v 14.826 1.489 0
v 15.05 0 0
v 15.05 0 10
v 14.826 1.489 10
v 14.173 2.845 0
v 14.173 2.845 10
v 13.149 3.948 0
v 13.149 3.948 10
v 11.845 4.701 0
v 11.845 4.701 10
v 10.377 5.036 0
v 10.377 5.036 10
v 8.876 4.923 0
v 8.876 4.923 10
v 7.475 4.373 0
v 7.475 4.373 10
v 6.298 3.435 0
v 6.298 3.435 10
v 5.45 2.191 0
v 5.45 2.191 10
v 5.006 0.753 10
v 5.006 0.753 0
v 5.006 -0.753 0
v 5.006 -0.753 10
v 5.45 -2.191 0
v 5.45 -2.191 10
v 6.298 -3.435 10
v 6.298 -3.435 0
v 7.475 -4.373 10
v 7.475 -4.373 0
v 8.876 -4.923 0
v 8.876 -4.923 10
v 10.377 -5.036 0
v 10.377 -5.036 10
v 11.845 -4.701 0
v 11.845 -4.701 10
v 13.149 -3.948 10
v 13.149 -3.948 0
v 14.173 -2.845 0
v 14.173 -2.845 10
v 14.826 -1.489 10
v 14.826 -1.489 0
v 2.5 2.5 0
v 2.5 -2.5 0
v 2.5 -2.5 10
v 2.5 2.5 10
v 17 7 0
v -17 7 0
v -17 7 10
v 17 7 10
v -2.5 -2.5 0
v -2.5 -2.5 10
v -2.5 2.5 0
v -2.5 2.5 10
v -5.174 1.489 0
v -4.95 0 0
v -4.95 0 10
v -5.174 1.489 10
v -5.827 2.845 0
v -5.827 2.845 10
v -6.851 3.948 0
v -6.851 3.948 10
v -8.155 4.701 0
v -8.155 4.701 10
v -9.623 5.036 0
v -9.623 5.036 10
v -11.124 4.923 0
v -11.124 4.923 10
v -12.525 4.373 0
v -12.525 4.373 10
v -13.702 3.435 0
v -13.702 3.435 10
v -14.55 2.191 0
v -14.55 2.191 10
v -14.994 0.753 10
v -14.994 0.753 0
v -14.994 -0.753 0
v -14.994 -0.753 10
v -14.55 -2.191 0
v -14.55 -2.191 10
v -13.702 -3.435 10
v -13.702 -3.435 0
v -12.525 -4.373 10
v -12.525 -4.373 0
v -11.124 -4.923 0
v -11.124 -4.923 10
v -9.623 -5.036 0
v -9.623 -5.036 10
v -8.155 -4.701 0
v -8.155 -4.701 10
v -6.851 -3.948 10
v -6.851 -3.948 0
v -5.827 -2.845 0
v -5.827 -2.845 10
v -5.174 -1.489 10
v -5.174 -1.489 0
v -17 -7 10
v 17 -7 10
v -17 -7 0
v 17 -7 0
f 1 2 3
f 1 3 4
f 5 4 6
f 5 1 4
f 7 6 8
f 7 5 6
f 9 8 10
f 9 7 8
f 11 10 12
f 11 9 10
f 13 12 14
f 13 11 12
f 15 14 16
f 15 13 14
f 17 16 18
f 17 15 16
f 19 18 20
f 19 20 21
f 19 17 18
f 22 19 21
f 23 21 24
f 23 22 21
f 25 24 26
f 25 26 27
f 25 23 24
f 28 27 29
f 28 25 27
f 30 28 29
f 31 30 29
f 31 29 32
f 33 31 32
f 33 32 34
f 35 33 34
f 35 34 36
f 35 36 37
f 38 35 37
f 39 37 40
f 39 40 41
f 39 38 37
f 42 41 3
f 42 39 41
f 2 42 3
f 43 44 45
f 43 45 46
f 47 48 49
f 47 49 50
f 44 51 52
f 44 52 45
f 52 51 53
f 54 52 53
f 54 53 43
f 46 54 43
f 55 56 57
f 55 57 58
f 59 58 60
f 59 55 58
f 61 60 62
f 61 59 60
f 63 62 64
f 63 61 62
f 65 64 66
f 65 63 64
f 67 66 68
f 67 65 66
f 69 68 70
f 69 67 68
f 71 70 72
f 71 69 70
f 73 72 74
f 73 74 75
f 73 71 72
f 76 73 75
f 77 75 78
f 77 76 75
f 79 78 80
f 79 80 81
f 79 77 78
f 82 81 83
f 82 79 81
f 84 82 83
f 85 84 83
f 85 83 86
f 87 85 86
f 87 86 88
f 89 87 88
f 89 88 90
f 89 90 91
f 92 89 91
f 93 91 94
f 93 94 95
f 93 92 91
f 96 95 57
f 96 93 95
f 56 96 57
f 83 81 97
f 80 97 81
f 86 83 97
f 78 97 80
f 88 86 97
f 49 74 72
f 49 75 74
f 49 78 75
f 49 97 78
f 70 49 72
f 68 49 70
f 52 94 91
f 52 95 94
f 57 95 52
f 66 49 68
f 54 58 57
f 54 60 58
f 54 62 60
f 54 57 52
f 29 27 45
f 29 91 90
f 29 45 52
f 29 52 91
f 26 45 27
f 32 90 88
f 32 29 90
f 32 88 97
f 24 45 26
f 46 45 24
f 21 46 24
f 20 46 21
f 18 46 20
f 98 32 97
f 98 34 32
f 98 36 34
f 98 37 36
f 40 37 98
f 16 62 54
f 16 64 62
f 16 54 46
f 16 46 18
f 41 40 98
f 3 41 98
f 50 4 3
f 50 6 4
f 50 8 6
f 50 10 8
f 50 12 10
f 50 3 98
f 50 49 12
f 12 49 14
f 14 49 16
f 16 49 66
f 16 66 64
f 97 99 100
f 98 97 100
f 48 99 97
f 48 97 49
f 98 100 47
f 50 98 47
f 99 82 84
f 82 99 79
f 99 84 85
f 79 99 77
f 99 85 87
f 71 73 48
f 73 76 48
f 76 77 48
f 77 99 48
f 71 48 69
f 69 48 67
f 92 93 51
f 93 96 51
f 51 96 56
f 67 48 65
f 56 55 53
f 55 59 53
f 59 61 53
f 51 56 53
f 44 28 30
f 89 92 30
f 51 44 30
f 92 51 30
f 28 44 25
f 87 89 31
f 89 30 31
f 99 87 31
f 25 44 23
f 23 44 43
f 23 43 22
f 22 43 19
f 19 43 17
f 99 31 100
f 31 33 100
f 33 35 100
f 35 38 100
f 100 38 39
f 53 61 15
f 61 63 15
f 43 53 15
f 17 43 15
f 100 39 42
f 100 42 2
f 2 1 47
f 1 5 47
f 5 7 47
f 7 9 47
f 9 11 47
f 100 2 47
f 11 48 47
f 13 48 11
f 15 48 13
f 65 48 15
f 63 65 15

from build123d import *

# Parameters (mm, degrees)
SKETCH_1_W      = 34
SKETCH_1_H      = 14
SKETCH_1_R      = 5.05
SKETCH_1_W_2    = 5
SKETCH_1_H_2    = 5
EXTRUDE_1_DEPTH = 10


with BuildPart() as part:
    # 草图1 → 凸台-拉伸1 (new body)
    with BuildSketch(Plane.XY):
        Rectangle(SKETCH_1_W, SKETCH_1_H)
        with Locations((-10, 0)):
            Circle(SKETCH_1_R, mode=Mode.SUBTRACT)
        with Locations((10, 0)):
            Circle(SKETCH_1_R, mode=Mode.SUBTRACT)
        Rectangle(SKETCH_1_W_2, SKETCH_1_H_2, mode=Mode.SUBTRACT)
    extrude(amount=EXTRUDE_1_DEPTH)


solid = part.part
